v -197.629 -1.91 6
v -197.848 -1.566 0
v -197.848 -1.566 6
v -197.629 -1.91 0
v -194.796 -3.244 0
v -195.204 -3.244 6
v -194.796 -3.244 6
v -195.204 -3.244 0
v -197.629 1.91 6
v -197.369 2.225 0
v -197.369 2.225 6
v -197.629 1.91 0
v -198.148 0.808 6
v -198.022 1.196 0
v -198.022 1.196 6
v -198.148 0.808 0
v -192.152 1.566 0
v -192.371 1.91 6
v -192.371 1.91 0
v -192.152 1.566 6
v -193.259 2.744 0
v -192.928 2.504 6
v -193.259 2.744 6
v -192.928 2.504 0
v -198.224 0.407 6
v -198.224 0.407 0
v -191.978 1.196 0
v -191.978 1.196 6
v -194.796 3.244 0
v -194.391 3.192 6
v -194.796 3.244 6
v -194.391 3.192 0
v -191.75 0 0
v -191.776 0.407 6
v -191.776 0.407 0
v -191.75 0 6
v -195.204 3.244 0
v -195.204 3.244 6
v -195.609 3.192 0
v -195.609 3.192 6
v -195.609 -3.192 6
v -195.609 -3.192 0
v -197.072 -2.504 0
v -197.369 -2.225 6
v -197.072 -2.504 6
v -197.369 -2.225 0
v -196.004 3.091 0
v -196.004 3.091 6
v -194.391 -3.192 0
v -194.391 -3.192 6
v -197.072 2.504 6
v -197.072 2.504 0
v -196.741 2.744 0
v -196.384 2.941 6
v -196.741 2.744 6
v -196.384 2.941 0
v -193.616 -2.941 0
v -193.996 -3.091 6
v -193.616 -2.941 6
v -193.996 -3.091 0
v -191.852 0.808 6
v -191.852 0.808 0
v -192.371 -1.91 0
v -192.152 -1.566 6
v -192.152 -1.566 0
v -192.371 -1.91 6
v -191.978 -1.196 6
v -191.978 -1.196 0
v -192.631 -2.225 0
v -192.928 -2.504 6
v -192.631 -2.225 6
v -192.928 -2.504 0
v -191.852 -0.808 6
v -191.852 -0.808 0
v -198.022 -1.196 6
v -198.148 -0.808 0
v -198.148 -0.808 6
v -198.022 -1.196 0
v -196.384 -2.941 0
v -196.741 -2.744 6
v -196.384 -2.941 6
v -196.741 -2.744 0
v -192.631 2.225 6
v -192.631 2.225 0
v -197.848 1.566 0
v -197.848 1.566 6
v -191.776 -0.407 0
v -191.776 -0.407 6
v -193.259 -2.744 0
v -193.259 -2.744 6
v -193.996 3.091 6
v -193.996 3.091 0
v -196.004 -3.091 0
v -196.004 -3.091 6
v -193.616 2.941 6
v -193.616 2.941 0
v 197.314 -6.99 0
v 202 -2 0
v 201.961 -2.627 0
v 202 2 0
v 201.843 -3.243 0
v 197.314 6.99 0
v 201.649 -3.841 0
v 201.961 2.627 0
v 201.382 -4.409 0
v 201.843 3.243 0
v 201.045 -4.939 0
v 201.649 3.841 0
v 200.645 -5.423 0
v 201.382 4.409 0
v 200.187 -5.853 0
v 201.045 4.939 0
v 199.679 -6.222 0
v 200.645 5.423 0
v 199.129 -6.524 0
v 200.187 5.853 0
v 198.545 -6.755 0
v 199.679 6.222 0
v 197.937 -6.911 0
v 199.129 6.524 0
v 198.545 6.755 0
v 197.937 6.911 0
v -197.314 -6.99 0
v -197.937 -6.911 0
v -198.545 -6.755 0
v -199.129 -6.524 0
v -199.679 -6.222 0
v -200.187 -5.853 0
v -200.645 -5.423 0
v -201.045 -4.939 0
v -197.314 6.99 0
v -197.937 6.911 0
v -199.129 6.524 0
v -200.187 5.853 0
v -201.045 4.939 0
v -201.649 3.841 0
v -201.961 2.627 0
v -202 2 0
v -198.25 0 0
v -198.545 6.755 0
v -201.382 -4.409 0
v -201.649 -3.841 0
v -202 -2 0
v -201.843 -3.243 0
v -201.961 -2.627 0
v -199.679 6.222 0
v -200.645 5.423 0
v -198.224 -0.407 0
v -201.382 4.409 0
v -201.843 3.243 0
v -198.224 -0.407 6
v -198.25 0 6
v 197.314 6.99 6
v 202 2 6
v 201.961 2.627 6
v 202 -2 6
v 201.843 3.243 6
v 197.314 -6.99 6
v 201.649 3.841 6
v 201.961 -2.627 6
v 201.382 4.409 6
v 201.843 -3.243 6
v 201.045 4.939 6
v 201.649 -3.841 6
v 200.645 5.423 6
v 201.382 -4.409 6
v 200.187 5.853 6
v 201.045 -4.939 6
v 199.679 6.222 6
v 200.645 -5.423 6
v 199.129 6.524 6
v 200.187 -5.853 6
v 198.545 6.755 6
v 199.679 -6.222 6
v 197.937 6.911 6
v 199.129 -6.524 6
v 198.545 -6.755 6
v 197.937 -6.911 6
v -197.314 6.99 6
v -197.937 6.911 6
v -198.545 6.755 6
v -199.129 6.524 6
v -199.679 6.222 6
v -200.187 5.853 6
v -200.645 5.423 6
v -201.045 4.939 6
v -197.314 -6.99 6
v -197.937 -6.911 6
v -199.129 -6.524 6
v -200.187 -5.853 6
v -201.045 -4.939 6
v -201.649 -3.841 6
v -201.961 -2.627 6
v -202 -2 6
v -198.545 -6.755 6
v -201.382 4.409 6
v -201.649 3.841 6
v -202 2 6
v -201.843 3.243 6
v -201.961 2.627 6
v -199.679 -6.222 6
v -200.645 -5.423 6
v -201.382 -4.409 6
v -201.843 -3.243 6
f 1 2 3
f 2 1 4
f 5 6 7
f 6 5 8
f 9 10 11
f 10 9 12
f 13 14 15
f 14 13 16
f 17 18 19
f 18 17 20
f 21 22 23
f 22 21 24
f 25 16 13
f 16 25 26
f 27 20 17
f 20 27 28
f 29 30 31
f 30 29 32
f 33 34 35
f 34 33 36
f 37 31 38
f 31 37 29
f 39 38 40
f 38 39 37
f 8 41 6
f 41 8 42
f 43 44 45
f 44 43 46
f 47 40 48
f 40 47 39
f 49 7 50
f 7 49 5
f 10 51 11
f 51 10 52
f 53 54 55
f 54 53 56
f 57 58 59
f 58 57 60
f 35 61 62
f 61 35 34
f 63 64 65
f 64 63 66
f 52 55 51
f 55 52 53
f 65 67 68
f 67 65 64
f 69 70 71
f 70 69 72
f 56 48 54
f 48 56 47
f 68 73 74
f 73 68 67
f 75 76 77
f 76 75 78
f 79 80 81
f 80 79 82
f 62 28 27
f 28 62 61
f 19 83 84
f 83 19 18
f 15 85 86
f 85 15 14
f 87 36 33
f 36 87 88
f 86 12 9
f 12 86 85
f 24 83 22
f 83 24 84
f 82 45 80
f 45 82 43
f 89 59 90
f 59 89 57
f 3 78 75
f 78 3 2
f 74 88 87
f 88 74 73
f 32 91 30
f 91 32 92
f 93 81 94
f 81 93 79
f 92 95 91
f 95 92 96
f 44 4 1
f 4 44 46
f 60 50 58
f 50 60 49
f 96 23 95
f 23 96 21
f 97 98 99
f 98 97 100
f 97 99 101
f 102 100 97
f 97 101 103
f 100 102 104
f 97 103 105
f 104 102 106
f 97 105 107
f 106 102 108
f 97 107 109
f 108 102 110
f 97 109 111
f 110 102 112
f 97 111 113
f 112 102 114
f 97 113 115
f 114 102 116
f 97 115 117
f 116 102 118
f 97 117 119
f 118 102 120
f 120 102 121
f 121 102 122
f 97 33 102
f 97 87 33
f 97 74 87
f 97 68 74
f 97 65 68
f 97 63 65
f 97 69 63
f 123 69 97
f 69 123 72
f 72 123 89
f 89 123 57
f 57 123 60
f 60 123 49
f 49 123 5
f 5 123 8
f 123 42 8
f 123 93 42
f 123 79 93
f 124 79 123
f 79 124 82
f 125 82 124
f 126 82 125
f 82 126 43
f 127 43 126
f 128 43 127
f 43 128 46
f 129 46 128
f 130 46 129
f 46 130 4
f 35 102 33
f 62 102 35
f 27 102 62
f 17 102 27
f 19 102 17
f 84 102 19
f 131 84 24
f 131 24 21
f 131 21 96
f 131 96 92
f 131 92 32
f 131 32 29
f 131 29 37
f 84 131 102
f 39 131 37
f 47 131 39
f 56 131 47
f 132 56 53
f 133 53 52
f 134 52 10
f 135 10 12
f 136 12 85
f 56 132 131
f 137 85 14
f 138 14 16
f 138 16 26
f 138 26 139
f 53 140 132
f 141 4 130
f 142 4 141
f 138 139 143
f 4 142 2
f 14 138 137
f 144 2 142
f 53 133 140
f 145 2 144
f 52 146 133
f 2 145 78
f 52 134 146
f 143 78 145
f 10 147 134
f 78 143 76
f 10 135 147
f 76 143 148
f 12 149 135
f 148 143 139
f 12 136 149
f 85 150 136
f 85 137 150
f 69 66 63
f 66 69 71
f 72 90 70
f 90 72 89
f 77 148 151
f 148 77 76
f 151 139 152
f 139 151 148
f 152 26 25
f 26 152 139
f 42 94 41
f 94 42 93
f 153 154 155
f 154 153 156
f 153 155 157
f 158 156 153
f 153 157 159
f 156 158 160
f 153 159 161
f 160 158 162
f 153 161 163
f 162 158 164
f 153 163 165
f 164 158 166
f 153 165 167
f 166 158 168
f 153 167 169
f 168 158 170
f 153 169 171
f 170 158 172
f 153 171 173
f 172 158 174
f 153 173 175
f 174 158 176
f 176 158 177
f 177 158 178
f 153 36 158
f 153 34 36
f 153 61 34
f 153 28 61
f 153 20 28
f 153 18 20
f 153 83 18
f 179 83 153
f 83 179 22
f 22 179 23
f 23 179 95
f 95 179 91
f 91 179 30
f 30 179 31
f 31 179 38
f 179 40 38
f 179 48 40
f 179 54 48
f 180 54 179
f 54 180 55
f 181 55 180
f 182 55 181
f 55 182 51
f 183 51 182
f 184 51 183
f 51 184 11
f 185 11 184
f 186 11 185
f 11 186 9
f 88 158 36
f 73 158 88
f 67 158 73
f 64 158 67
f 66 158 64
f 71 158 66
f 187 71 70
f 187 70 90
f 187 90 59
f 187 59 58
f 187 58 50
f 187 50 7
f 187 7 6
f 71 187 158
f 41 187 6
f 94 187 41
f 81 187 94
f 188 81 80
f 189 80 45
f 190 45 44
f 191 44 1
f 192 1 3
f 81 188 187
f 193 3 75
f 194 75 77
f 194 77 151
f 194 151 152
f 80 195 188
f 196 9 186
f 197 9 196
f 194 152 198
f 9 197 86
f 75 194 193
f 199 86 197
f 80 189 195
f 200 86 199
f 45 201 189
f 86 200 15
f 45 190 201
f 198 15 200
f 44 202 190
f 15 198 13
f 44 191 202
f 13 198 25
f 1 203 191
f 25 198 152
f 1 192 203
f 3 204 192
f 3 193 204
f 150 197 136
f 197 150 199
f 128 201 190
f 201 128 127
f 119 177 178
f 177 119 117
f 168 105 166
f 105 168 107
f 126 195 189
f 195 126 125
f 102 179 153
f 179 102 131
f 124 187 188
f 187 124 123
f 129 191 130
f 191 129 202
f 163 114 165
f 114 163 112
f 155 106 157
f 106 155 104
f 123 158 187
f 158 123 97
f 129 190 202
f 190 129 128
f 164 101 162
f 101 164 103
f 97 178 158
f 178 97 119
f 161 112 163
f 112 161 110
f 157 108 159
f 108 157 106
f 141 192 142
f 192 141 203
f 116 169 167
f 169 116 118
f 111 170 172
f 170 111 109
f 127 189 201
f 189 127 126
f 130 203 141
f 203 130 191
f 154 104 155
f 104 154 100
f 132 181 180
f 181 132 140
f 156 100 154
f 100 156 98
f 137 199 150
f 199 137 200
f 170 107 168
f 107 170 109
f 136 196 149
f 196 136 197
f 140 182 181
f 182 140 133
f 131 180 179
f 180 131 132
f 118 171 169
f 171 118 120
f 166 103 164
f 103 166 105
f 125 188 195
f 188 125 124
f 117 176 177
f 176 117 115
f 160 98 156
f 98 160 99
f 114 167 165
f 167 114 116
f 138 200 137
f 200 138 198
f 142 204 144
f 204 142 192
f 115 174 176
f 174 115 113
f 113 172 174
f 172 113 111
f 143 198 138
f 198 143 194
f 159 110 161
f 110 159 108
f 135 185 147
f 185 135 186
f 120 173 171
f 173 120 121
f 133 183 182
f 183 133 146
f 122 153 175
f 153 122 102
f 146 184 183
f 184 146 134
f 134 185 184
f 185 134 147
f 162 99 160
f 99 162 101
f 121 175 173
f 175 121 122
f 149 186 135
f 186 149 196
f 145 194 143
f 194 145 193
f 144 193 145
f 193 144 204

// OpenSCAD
$fn = 50;


difference() {
	union() {
		hull() {
			translate(v = [-197.0000000000, 2.0000000000, 0]) {
				cylinder(h = 6, r = 5);
			}
			translate(v = [197.0000000000, 2.0000000000, 0]) {
				cylinder(h = 6, r = 5);
			}
			translate(v = [-197.0000000000, -2.0000000000, 0]) {
				cylinder(h = 6, r = 5);
			}
			translate(v = [197.0000000000, -2.0000000000, 0]) {
				cylinder(h = 6, r = 5);
			}
		}
	}
	union() {
		translate(v = [-195.0000000000, 0.0000000000, 0]) {
			cylinder(h = 6, r = 3.2500000000);
		}
		translate(v = [-195.0000000000, 0.0000000000, 0]) {
			cylinder(h = 6, r = 1.8000000000);
		}
		translate(v = [-195.0000000000, 0.0000000000, 0]) {
			cylinder(h = 6, r = 1.8000000000);
		}
		translate(v = [-195.0000000000, 0.0000000000, 0]) {
			cylinder(h = 6, r = 1.8000000000);
		}
	}
}
